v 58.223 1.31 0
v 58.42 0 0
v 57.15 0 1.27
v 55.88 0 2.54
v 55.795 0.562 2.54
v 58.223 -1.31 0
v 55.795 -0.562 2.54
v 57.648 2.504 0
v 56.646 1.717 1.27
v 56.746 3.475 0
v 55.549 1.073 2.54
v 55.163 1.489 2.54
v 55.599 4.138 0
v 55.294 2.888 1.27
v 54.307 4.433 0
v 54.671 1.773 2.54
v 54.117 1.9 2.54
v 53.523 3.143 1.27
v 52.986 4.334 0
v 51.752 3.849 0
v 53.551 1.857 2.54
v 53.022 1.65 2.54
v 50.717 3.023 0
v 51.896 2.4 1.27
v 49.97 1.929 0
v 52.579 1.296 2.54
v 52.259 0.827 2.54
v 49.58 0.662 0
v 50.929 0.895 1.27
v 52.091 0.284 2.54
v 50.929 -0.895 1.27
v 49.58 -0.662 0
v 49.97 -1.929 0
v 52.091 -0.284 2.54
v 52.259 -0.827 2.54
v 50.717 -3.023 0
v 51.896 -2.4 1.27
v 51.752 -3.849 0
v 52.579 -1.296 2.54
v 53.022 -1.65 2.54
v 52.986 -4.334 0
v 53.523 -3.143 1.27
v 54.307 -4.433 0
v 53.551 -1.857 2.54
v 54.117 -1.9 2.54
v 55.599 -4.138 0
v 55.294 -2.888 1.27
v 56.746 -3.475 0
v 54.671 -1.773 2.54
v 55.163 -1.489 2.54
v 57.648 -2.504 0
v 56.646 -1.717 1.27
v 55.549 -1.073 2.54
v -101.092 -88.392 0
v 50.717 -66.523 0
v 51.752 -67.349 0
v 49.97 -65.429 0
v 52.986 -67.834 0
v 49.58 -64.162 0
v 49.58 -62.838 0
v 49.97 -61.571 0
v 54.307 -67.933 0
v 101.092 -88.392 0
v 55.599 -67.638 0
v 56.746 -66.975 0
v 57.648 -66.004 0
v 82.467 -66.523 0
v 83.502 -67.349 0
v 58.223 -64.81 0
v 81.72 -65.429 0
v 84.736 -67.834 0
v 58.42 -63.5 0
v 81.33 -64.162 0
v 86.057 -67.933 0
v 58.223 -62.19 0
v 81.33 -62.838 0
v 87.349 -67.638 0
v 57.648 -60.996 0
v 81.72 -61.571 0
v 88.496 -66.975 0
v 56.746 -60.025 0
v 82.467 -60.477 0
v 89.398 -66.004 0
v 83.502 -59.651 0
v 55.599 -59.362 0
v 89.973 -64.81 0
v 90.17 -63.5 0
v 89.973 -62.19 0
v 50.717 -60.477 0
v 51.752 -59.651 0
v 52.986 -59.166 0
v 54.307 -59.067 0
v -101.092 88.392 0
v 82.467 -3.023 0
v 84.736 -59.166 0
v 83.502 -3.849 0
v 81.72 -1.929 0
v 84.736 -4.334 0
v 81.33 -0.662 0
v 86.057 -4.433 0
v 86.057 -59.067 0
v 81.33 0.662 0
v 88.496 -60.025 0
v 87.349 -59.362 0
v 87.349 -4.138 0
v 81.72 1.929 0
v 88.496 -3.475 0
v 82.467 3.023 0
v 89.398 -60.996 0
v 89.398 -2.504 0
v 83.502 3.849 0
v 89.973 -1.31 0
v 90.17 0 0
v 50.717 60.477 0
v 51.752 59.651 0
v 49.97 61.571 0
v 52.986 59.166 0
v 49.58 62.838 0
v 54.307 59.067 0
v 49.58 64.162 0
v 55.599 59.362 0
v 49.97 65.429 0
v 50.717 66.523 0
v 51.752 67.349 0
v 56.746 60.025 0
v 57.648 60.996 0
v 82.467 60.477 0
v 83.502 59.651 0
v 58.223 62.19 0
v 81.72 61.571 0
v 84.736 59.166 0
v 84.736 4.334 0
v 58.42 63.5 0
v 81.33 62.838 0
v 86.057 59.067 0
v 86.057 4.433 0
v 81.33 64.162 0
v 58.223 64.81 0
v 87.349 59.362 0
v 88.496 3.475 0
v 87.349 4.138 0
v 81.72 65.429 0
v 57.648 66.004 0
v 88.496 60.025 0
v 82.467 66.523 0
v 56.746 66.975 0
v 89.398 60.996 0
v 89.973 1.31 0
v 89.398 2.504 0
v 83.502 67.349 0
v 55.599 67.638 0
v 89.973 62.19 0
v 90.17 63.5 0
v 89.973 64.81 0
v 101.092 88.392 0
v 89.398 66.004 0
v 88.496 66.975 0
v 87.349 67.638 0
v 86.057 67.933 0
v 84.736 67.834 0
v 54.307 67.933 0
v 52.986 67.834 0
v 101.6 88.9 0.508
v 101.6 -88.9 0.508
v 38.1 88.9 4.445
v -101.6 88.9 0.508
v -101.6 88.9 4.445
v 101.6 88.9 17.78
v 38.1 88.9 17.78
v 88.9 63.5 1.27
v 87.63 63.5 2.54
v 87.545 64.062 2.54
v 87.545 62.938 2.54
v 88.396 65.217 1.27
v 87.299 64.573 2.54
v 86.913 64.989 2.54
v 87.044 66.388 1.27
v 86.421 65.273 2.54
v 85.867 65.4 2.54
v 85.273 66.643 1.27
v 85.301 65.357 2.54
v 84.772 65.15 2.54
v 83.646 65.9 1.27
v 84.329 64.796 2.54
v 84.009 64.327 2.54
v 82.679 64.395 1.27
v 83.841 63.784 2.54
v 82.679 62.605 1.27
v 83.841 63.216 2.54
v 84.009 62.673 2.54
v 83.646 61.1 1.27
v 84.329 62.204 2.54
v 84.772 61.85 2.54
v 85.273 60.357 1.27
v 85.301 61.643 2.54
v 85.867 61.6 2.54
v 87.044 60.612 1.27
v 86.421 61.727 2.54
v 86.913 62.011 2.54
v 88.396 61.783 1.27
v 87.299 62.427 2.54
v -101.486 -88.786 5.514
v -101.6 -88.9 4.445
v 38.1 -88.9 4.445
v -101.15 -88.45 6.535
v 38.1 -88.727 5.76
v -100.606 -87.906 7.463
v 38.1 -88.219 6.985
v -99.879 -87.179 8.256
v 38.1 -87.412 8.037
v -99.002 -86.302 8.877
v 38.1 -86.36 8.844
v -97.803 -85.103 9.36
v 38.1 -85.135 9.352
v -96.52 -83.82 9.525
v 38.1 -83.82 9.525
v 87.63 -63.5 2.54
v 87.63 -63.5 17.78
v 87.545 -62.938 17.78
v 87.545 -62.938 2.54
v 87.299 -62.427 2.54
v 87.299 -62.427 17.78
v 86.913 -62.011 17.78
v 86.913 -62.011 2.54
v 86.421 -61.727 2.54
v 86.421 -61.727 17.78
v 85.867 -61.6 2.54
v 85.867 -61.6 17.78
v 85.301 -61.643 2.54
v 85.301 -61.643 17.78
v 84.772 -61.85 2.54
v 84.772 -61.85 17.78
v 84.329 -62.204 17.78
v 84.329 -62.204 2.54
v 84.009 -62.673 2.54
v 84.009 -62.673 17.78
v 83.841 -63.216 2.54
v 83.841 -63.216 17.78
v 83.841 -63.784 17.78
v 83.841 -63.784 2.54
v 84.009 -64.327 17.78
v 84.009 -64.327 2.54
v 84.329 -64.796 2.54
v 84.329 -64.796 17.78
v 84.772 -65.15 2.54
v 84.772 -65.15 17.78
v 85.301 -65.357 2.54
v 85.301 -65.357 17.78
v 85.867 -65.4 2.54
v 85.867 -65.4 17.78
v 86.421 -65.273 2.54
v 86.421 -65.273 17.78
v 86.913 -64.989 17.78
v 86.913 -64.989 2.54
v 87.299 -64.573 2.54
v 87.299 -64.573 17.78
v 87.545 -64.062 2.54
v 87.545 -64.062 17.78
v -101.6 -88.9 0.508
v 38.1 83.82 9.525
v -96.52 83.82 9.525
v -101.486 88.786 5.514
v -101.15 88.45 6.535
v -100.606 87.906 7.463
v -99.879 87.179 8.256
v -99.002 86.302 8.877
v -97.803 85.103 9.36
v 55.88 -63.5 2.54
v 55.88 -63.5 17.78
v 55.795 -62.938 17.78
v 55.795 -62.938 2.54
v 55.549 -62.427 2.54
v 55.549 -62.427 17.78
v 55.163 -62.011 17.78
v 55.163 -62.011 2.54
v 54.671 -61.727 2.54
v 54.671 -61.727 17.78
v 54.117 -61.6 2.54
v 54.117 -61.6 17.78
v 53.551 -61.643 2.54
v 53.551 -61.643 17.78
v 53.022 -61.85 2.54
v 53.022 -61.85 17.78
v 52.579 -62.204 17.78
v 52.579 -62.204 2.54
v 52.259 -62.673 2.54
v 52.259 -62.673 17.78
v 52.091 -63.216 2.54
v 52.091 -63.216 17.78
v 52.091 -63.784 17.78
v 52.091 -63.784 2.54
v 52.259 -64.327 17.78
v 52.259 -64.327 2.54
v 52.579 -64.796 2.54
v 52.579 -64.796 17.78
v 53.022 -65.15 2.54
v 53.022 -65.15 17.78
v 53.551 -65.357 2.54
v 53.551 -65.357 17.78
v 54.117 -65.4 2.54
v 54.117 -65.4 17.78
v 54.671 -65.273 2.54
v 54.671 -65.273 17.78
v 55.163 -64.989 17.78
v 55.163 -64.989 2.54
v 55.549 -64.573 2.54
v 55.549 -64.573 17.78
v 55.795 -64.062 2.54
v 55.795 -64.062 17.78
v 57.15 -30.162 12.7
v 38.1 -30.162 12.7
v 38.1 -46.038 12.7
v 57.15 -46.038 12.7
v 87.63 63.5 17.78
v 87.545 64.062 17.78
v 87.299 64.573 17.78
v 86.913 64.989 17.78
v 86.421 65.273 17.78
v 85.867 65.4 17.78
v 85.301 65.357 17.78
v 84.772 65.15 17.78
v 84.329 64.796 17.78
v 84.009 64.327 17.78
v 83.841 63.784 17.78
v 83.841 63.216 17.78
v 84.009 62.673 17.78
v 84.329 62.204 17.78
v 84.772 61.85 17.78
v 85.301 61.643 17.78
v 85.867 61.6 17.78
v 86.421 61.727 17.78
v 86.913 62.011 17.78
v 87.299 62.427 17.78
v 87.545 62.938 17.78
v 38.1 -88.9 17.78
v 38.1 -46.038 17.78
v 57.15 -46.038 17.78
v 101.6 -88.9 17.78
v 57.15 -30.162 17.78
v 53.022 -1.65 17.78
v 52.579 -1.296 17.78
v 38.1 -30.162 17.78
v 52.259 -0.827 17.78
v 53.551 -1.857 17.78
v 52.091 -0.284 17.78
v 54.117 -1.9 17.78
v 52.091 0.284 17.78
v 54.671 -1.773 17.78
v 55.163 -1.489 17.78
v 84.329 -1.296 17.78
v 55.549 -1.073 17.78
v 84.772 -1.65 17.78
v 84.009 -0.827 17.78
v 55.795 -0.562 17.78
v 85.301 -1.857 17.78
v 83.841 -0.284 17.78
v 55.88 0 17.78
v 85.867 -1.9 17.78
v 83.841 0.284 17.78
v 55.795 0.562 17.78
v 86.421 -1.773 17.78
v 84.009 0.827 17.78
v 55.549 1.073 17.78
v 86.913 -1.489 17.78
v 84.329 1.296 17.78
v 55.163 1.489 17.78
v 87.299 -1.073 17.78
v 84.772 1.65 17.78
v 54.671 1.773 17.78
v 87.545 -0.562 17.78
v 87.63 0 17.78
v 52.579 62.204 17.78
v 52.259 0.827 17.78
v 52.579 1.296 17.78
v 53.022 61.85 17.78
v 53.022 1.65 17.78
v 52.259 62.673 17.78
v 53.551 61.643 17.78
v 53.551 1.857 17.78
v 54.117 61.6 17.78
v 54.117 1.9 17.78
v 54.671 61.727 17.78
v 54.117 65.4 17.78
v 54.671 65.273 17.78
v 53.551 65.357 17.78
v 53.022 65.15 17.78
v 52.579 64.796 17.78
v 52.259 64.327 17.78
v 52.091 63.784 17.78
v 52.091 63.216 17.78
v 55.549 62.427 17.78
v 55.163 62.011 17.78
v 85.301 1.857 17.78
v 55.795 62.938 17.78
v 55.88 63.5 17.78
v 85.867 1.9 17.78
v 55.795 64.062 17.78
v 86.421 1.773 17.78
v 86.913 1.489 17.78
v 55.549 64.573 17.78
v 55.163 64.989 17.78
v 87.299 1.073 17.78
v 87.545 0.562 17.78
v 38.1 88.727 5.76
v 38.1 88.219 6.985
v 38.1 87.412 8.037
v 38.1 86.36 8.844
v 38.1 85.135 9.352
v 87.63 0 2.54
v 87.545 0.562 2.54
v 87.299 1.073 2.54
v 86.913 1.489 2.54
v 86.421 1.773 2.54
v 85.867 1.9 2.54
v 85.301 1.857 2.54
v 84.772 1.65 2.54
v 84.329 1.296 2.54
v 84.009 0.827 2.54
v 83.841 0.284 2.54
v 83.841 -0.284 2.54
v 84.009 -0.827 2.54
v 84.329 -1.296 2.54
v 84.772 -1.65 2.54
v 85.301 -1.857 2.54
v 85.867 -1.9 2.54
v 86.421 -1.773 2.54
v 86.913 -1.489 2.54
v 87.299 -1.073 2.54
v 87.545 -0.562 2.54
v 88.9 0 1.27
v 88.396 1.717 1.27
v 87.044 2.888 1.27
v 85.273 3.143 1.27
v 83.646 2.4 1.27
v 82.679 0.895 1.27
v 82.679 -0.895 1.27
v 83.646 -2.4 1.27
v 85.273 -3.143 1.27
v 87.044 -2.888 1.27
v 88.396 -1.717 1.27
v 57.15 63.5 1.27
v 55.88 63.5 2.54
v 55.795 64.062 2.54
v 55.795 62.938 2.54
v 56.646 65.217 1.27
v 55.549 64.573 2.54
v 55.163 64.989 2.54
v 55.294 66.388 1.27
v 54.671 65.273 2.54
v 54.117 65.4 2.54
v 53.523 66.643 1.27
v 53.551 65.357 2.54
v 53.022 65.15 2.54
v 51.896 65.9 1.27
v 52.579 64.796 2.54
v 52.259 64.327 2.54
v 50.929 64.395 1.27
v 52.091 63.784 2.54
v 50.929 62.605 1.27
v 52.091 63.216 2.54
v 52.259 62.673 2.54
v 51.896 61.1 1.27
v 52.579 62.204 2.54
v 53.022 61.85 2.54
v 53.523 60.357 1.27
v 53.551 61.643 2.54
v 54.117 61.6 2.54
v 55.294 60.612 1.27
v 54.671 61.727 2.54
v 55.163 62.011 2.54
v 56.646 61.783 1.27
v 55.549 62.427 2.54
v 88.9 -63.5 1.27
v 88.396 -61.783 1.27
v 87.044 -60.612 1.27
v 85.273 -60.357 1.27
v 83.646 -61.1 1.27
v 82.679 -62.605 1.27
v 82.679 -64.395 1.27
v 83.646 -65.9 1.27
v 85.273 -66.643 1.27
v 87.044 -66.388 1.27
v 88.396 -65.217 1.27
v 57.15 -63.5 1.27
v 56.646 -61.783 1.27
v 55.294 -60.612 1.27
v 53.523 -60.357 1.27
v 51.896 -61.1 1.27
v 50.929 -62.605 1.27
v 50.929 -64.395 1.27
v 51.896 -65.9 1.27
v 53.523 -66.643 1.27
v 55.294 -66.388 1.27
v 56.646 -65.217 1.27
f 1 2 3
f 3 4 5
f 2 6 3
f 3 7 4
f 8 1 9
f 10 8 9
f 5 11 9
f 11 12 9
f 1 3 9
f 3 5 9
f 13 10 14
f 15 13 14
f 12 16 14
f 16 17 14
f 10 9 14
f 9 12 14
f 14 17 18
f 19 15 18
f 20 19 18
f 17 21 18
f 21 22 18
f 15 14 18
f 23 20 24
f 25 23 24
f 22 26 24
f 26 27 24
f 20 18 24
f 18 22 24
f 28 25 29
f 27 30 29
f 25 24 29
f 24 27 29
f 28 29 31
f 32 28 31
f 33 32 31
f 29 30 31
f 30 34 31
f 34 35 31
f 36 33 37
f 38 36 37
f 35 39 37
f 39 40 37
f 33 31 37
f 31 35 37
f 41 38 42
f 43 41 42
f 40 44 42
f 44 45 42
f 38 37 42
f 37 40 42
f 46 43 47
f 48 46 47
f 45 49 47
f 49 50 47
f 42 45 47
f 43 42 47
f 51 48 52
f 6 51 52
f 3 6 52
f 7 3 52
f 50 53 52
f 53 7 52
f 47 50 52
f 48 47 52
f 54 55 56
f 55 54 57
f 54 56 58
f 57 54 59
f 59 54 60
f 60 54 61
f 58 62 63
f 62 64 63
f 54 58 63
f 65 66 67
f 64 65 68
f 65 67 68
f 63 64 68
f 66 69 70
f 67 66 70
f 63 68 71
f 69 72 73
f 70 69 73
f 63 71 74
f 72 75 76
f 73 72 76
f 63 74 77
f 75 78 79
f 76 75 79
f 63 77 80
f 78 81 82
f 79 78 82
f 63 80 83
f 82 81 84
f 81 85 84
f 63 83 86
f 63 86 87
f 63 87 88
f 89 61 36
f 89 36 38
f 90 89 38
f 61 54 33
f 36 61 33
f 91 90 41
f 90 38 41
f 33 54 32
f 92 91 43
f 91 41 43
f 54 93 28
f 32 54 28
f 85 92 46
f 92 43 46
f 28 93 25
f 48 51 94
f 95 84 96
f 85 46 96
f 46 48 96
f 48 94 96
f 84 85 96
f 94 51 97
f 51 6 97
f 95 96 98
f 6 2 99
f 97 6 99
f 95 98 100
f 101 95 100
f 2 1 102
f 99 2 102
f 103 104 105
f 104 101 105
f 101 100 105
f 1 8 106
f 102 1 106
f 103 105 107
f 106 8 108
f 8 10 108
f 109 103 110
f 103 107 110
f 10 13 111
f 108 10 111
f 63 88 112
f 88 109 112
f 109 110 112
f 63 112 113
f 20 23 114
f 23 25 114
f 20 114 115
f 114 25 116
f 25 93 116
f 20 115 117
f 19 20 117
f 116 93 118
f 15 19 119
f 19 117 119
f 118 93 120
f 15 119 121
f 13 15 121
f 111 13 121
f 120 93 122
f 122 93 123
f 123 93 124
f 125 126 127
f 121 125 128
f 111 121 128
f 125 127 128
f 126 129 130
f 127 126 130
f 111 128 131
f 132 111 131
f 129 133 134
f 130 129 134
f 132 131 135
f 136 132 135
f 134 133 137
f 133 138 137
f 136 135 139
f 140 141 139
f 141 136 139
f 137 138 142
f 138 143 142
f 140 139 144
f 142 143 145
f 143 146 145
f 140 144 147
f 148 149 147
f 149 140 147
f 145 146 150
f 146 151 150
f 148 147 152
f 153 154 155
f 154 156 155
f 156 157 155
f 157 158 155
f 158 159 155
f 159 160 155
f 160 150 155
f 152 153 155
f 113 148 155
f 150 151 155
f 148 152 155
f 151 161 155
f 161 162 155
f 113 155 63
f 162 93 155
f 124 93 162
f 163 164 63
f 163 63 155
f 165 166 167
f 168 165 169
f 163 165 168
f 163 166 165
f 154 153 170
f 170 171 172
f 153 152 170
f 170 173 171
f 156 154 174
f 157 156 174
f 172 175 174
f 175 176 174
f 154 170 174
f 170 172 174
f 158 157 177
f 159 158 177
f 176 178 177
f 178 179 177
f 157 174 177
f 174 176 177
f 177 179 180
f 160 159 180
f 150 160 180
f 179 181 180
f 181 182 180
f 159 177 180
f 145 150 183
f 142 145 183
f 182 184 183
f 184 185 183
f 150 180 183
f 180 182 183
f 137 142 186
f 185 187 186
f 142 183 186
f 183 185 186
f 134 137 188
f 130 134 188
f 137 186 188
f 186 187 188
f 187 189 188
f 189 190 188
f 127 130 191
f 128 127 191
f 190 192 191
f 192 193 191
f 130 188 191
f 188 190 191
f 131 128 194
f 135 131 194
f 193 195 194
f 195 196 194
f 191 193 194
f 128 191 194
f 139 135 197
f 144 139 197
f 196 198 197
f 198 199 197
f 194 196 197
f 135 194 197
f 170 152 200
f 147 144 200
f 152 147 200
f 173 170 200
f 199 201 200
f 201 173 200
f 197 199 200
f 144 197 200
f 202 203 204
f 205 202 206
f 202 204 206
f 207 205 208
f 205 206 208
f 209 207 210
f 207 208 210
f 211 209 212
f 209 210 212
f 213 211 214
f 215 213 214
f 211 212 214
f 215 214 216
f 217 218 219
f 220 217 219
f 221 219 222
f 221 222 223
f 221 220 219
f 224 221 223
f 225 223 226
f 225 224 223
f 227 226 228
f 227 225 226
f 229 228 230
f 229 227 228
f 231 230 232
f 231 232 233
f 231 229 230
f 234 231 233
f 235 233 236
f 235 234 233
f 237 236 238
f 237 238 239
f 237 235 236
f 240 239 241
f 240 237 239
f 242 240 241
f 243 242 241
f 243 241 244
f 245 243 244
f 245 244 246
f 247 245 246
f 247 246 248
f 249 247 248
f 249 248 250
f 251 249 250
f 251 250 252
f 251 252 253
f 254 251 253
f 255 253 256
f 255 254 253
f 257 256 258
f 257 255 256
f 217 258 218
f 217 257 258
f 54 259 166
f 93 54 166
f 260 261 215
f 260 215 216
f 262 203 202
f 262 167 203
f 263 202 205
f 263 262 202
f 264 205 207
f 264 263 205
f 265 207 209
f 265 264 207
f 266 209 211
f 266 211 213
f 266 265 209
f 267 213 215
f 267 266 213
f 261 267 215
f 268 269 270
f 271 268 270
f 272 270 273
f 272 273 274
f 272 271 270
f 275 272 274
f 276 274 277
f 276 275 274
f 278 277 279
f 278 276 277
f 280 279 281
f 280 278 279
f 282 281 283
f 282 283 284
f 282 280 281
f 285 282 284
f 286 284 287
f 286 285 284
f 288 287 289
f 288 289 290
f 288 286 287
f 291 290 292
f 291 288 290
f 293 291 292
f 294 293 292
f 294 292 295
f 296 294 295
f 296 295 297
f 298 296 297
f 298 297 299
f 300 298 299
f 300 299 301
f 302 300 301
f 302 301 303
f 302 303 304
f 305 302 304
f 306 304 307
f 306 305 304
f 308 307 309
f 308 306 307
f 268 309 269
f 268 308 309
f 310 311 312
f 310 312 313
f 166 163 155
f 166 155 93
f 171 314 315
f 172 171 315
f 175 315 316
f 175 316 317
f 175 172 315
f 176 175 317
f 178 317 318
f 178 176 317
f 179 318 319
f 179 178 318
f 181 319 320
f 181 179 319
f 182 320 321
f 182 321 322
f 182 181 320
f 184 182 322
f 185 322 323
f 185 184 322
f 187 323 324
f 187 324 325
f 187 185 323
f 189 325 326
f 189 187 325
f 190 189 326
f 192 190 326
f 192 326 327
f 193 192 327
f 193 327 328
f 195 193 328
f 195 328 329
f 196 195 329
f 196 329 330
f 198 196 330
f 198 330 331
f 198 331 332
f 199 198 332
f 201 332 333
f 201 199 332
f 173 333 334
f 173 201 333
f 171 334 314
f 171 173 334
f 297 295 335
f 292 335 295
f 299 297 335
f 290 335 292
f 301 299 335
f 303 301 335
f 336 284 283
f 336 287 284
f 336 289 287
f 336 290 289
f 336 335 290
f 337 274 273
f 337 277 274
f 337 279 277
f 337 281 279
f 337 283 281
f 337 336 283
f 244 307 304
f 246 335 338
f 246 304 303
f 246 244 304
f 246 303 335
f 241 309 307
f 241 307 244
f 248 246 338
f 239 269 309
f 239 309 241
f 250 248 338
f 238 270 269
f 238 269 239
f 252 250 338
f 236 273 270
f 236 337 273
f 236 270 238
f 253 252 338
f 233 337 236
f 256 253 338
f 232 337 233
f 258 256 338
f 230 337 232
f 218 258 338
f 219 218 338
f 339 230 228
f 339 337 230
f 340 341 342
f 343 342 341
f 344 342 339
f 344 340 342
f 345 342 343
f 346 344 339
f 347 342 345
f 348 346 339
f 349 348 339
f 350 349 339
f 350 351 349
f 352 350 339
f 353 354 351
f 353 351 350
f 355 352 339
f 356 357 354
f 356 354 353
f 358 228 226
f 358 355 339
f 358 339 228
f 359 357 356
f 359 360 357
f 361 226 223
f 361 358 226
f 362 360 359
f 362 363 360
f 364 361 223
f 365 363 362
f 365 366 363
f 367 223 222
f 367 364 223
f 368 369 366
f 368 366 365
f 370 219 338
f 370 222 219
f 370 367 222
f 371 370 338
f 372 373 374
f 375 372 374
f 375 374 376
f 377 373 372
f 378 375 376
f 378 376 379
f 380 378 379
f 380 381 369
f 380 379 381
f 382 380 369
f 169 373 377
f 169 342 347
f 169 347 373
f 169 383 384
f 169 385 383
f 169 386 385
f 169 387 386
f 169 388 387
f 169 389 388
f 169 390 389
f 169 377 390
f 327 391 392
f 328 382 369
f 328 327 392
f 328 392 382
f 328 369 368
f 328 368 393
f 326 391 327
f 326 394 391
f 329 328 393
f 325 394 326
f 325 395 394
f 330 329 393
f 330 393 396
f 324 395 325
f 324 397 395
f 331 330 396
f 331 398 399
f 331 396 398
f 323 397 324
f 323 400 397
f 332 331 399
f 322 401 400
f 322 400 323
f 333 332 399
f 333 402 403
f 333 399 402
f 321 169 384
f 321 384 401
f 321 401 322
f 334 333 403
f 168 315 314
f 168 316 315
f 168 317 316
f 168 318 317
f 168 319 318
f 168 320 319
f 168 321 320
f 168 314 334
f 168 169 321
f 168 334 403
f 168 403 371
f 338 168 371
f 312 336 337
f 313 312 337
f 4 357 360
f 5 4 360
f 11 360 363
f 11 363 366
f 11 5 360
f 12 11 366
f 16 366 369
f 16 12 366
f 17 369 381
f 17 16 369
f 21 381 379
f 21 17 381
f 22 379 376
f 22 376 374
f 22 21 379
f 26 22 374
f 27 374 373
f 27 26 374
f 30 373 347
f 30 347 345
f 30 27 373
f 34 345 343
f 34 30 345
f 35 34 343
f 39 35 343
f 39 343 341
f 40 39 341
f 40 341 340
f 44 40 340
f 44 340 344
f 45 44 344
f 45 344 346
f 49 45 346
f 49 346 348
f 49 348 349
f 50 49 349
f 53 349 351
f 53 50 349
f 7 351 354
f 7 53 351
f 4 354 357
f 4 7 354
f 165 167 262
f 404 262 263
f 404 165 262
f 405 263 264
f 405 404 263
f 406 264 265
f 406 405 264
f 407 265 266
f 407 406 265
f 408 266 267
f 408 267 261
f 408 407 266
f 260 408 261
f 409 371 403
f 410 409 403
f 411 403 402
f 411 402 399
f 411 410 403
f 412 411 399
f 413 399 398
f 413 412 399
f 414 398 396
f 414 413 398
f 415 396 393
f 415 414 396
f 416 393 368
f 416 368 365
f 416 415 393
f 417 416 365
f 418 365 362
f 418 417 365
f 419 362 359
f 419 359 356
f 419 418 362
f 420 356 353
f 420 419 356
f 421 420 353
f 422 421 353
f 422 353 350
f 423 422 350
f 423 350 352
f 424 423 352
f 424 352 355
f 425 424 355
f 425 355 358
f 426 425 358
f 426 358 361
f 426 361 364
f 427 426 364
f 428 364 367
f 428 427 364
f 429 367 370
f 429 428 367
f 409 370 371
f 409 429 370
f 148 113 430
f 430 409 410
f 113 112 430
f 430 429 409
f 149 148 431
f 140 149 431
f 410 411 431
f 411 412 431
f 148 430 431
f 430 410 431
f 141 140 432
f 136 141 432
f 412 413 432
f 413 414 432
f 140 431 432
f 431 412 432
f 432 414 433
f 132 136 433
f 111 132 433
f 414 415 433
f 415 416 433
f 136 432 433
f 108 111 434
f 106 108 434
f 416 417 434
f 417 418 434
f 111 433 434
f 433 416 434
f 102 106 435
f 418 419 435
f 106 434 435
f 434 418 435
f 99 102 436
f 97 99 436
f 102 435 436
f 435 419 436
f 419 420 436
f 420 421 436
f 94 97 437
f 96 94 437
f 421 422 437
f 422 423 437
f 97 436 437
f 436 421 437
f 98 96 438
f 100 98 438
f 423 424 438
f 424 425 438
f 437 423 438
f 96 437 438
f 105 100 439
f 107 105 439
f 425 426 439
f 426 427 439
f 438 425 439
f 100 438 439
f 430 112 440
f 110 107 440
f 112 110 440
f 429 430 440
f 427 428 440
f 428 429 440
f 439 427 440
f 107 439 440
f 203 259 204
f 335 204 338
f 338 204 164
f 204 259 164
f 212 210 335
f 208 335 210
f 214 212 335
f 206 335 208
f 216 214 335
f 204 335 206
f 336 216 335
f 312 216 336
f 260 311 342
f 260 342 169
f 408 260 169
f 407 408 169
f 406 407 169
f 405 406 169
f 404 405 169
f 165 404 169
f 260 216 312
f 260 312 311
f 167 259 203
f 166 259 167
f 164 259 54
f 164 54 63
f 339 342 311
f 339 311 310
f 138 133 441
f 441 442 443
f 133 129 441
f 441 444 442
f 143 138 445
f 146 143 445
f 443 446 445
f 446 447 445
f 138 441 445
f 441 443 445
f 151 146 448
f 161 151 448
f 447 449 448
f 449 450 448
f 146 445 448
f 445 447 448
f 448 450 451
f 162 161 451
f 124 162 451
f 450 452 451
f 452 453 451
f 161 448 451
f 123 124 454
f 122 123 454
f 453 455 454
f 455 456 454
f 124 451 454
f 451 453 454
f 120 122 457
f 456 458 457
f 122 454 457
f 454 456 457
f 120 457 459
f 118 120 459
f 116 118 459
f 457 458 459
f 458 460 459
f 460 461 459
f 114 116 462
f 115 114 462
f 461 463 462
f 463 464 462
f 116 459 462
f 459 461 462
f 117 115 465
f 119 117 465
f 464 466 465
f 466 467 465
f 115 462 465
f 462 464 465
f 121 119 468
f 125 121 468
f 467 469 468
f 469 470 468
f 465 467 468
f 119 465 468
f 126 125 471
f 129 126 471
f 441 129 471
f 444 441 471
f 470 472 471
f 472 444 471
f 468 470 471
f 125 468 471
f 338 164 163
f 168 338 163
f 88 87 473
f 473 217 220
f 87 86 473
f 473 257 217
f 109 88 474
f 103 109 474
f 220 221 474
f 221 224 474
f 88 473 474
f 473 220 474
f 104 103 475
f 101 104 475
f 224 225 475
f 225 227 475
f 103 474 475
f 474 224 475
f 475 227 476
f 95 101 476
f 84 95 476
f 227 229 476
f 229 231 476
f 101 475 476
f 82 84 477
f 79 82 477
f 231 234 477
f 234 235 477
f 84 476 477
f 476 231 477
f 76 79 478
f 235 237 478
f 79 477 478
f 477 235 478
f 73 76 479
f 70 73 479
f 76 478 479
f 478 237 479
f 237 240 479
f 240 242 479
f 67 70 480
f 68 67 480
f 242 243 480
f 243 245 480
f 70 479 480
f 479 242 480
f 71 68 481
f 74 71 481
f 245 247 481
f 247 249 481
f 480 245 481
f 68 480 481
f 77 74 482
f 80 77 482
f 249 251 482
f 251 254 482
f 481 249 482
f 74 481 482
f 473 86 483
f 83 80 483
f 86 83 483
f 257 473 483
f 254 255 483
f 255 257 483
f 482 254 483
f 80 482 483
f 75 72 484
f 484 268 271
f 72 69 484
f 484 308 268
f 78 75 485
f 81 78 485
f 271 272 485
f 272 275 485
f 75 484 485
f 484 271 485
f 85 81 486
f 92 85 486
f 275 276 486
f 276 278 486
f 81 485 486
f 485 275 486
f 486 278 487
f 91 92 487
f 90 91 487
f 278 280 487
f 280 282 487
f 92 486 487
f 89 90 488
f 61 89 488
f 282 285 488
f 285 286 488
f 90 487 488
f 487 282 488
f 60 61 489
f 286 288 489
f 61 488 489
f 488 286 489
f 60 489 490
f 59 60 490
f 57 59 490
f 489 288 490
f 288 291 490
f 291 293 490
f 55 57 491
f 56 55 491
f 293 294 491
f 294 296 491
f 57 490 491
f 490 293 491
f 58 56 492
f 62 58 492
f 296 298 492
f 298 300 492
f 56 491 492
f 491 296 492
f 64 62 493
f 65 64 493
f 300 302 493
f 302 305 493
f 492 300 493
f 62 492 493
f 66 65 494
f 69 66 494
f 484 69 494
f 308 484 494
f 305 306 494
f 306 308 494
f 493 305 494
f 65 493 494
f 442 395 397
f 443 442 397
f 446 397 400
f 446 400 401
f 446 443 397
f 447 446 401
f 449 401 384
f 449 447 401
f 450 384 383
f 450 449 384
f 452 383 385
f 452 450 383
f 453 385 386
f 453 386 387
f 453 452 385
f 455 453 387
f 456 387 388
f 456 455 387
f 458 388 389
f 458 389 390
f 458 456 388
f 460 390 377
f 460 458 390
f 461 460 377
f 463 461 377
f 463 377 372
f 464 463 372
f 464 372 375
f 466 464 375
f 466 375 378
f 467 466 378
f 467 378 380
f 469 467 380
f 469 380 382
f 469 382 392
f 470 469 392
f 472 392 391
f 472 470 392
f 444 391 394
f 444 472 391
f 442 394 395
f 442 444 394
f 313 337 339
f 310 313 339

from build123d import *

# Parameters (mm, degrees)
F0_W     = 139.7
F0_H     = 177.8
F1_DEPTH = 9.525
F0_W_2   = 63.5
F0_R     = 1.905
F2_DEPTH = 17.78
F3_SIZE  = 2.54
F4_SIZE  = 0.508
F5_R     = 5.08
F6_W     = 19.05
F6_H     = 15.875
F7_DEPTH = 5.08


with BuildPart() as f1:
    # F0 (on Top) → F1 (new body)
    with BuildSketch(Plane.XY):
        with Locations((-31.75, 0)):
            Rectangle(F0_W, F0_H)
    extrude(amount=F1_DEPTH)

    # F0 (on Top) → F2 (join)
    with BuildSketch(Plane.XY):
        with Locations((69.85, 0)):
            Rectangle(F0_W_2, F0_H)
        with Locations((53.975, -63.5)):
            Circle(F0_R, mode=Mode.SUBTRACT)
        with Locations((85.725, -63.5)):
            Circle(F0_R, mode=Mode.SUBTRACT)
        with Locations((53.975, 0)):
            Circle(F0_R, mode=Mode.SUBTRACT)
        with Locations((85.725, 0)):
            Circle(F0_R, mode=Mode.SUBTRACT)
        with Locations((53.975, 63.5)):
            Circle(F0_R, mode=Mode.SUBTRACT)
        with Locations((85.725, 63.5)):
            Circle(F0_R, mode=Mode.SUBTRACT)
    extrude(amount=F2_DEPTH)

    # F3
    f3_edges = [f1.edges().sort_by_distance(p)[0] for p in [
        (52.07, -63.5, 0),
        (83.82, -63.5, 0),
        (52.07, 0, 0),
        (83.82, 0, 0),
        (52.07, 63.5, 0),
        (83.82, 63.5, 0),
    ]]
    chamfer(f3_edges, length=F3_SIZE)

    # F4
    f4_edges = [f1.edges().sort_by_distance(p)[0] for p in [
        (0, -88.9, 0),
        (101.6, 0, 0),
        (0, 88.9, 0),
        (-101.6, 0, 0),
    ]]
    chamfer(f4_edges, length=F4_SIZE)

    # F5
    f5_edges = [f1.edges().sort_by_distance(p)[0] for p in [
        (-31.75, -88.9, 9.525),
        (-101.6, 0, 9.525),
        (-31.75, 88.9, 9.525),
    ]]
    fillet(f5_edges, radius=F5_R)

    # F6 (on face) → F7 (cut)
    with BuildSketch(Plane.XY.offset(17.78)):
        with Locations((47.625, -38.1)):
            Rectangle(F6_W, F6_H)
    extrude(amount=-F7_DEPTH, mode=Mode.SUBTRACT)


solid = f1.part
